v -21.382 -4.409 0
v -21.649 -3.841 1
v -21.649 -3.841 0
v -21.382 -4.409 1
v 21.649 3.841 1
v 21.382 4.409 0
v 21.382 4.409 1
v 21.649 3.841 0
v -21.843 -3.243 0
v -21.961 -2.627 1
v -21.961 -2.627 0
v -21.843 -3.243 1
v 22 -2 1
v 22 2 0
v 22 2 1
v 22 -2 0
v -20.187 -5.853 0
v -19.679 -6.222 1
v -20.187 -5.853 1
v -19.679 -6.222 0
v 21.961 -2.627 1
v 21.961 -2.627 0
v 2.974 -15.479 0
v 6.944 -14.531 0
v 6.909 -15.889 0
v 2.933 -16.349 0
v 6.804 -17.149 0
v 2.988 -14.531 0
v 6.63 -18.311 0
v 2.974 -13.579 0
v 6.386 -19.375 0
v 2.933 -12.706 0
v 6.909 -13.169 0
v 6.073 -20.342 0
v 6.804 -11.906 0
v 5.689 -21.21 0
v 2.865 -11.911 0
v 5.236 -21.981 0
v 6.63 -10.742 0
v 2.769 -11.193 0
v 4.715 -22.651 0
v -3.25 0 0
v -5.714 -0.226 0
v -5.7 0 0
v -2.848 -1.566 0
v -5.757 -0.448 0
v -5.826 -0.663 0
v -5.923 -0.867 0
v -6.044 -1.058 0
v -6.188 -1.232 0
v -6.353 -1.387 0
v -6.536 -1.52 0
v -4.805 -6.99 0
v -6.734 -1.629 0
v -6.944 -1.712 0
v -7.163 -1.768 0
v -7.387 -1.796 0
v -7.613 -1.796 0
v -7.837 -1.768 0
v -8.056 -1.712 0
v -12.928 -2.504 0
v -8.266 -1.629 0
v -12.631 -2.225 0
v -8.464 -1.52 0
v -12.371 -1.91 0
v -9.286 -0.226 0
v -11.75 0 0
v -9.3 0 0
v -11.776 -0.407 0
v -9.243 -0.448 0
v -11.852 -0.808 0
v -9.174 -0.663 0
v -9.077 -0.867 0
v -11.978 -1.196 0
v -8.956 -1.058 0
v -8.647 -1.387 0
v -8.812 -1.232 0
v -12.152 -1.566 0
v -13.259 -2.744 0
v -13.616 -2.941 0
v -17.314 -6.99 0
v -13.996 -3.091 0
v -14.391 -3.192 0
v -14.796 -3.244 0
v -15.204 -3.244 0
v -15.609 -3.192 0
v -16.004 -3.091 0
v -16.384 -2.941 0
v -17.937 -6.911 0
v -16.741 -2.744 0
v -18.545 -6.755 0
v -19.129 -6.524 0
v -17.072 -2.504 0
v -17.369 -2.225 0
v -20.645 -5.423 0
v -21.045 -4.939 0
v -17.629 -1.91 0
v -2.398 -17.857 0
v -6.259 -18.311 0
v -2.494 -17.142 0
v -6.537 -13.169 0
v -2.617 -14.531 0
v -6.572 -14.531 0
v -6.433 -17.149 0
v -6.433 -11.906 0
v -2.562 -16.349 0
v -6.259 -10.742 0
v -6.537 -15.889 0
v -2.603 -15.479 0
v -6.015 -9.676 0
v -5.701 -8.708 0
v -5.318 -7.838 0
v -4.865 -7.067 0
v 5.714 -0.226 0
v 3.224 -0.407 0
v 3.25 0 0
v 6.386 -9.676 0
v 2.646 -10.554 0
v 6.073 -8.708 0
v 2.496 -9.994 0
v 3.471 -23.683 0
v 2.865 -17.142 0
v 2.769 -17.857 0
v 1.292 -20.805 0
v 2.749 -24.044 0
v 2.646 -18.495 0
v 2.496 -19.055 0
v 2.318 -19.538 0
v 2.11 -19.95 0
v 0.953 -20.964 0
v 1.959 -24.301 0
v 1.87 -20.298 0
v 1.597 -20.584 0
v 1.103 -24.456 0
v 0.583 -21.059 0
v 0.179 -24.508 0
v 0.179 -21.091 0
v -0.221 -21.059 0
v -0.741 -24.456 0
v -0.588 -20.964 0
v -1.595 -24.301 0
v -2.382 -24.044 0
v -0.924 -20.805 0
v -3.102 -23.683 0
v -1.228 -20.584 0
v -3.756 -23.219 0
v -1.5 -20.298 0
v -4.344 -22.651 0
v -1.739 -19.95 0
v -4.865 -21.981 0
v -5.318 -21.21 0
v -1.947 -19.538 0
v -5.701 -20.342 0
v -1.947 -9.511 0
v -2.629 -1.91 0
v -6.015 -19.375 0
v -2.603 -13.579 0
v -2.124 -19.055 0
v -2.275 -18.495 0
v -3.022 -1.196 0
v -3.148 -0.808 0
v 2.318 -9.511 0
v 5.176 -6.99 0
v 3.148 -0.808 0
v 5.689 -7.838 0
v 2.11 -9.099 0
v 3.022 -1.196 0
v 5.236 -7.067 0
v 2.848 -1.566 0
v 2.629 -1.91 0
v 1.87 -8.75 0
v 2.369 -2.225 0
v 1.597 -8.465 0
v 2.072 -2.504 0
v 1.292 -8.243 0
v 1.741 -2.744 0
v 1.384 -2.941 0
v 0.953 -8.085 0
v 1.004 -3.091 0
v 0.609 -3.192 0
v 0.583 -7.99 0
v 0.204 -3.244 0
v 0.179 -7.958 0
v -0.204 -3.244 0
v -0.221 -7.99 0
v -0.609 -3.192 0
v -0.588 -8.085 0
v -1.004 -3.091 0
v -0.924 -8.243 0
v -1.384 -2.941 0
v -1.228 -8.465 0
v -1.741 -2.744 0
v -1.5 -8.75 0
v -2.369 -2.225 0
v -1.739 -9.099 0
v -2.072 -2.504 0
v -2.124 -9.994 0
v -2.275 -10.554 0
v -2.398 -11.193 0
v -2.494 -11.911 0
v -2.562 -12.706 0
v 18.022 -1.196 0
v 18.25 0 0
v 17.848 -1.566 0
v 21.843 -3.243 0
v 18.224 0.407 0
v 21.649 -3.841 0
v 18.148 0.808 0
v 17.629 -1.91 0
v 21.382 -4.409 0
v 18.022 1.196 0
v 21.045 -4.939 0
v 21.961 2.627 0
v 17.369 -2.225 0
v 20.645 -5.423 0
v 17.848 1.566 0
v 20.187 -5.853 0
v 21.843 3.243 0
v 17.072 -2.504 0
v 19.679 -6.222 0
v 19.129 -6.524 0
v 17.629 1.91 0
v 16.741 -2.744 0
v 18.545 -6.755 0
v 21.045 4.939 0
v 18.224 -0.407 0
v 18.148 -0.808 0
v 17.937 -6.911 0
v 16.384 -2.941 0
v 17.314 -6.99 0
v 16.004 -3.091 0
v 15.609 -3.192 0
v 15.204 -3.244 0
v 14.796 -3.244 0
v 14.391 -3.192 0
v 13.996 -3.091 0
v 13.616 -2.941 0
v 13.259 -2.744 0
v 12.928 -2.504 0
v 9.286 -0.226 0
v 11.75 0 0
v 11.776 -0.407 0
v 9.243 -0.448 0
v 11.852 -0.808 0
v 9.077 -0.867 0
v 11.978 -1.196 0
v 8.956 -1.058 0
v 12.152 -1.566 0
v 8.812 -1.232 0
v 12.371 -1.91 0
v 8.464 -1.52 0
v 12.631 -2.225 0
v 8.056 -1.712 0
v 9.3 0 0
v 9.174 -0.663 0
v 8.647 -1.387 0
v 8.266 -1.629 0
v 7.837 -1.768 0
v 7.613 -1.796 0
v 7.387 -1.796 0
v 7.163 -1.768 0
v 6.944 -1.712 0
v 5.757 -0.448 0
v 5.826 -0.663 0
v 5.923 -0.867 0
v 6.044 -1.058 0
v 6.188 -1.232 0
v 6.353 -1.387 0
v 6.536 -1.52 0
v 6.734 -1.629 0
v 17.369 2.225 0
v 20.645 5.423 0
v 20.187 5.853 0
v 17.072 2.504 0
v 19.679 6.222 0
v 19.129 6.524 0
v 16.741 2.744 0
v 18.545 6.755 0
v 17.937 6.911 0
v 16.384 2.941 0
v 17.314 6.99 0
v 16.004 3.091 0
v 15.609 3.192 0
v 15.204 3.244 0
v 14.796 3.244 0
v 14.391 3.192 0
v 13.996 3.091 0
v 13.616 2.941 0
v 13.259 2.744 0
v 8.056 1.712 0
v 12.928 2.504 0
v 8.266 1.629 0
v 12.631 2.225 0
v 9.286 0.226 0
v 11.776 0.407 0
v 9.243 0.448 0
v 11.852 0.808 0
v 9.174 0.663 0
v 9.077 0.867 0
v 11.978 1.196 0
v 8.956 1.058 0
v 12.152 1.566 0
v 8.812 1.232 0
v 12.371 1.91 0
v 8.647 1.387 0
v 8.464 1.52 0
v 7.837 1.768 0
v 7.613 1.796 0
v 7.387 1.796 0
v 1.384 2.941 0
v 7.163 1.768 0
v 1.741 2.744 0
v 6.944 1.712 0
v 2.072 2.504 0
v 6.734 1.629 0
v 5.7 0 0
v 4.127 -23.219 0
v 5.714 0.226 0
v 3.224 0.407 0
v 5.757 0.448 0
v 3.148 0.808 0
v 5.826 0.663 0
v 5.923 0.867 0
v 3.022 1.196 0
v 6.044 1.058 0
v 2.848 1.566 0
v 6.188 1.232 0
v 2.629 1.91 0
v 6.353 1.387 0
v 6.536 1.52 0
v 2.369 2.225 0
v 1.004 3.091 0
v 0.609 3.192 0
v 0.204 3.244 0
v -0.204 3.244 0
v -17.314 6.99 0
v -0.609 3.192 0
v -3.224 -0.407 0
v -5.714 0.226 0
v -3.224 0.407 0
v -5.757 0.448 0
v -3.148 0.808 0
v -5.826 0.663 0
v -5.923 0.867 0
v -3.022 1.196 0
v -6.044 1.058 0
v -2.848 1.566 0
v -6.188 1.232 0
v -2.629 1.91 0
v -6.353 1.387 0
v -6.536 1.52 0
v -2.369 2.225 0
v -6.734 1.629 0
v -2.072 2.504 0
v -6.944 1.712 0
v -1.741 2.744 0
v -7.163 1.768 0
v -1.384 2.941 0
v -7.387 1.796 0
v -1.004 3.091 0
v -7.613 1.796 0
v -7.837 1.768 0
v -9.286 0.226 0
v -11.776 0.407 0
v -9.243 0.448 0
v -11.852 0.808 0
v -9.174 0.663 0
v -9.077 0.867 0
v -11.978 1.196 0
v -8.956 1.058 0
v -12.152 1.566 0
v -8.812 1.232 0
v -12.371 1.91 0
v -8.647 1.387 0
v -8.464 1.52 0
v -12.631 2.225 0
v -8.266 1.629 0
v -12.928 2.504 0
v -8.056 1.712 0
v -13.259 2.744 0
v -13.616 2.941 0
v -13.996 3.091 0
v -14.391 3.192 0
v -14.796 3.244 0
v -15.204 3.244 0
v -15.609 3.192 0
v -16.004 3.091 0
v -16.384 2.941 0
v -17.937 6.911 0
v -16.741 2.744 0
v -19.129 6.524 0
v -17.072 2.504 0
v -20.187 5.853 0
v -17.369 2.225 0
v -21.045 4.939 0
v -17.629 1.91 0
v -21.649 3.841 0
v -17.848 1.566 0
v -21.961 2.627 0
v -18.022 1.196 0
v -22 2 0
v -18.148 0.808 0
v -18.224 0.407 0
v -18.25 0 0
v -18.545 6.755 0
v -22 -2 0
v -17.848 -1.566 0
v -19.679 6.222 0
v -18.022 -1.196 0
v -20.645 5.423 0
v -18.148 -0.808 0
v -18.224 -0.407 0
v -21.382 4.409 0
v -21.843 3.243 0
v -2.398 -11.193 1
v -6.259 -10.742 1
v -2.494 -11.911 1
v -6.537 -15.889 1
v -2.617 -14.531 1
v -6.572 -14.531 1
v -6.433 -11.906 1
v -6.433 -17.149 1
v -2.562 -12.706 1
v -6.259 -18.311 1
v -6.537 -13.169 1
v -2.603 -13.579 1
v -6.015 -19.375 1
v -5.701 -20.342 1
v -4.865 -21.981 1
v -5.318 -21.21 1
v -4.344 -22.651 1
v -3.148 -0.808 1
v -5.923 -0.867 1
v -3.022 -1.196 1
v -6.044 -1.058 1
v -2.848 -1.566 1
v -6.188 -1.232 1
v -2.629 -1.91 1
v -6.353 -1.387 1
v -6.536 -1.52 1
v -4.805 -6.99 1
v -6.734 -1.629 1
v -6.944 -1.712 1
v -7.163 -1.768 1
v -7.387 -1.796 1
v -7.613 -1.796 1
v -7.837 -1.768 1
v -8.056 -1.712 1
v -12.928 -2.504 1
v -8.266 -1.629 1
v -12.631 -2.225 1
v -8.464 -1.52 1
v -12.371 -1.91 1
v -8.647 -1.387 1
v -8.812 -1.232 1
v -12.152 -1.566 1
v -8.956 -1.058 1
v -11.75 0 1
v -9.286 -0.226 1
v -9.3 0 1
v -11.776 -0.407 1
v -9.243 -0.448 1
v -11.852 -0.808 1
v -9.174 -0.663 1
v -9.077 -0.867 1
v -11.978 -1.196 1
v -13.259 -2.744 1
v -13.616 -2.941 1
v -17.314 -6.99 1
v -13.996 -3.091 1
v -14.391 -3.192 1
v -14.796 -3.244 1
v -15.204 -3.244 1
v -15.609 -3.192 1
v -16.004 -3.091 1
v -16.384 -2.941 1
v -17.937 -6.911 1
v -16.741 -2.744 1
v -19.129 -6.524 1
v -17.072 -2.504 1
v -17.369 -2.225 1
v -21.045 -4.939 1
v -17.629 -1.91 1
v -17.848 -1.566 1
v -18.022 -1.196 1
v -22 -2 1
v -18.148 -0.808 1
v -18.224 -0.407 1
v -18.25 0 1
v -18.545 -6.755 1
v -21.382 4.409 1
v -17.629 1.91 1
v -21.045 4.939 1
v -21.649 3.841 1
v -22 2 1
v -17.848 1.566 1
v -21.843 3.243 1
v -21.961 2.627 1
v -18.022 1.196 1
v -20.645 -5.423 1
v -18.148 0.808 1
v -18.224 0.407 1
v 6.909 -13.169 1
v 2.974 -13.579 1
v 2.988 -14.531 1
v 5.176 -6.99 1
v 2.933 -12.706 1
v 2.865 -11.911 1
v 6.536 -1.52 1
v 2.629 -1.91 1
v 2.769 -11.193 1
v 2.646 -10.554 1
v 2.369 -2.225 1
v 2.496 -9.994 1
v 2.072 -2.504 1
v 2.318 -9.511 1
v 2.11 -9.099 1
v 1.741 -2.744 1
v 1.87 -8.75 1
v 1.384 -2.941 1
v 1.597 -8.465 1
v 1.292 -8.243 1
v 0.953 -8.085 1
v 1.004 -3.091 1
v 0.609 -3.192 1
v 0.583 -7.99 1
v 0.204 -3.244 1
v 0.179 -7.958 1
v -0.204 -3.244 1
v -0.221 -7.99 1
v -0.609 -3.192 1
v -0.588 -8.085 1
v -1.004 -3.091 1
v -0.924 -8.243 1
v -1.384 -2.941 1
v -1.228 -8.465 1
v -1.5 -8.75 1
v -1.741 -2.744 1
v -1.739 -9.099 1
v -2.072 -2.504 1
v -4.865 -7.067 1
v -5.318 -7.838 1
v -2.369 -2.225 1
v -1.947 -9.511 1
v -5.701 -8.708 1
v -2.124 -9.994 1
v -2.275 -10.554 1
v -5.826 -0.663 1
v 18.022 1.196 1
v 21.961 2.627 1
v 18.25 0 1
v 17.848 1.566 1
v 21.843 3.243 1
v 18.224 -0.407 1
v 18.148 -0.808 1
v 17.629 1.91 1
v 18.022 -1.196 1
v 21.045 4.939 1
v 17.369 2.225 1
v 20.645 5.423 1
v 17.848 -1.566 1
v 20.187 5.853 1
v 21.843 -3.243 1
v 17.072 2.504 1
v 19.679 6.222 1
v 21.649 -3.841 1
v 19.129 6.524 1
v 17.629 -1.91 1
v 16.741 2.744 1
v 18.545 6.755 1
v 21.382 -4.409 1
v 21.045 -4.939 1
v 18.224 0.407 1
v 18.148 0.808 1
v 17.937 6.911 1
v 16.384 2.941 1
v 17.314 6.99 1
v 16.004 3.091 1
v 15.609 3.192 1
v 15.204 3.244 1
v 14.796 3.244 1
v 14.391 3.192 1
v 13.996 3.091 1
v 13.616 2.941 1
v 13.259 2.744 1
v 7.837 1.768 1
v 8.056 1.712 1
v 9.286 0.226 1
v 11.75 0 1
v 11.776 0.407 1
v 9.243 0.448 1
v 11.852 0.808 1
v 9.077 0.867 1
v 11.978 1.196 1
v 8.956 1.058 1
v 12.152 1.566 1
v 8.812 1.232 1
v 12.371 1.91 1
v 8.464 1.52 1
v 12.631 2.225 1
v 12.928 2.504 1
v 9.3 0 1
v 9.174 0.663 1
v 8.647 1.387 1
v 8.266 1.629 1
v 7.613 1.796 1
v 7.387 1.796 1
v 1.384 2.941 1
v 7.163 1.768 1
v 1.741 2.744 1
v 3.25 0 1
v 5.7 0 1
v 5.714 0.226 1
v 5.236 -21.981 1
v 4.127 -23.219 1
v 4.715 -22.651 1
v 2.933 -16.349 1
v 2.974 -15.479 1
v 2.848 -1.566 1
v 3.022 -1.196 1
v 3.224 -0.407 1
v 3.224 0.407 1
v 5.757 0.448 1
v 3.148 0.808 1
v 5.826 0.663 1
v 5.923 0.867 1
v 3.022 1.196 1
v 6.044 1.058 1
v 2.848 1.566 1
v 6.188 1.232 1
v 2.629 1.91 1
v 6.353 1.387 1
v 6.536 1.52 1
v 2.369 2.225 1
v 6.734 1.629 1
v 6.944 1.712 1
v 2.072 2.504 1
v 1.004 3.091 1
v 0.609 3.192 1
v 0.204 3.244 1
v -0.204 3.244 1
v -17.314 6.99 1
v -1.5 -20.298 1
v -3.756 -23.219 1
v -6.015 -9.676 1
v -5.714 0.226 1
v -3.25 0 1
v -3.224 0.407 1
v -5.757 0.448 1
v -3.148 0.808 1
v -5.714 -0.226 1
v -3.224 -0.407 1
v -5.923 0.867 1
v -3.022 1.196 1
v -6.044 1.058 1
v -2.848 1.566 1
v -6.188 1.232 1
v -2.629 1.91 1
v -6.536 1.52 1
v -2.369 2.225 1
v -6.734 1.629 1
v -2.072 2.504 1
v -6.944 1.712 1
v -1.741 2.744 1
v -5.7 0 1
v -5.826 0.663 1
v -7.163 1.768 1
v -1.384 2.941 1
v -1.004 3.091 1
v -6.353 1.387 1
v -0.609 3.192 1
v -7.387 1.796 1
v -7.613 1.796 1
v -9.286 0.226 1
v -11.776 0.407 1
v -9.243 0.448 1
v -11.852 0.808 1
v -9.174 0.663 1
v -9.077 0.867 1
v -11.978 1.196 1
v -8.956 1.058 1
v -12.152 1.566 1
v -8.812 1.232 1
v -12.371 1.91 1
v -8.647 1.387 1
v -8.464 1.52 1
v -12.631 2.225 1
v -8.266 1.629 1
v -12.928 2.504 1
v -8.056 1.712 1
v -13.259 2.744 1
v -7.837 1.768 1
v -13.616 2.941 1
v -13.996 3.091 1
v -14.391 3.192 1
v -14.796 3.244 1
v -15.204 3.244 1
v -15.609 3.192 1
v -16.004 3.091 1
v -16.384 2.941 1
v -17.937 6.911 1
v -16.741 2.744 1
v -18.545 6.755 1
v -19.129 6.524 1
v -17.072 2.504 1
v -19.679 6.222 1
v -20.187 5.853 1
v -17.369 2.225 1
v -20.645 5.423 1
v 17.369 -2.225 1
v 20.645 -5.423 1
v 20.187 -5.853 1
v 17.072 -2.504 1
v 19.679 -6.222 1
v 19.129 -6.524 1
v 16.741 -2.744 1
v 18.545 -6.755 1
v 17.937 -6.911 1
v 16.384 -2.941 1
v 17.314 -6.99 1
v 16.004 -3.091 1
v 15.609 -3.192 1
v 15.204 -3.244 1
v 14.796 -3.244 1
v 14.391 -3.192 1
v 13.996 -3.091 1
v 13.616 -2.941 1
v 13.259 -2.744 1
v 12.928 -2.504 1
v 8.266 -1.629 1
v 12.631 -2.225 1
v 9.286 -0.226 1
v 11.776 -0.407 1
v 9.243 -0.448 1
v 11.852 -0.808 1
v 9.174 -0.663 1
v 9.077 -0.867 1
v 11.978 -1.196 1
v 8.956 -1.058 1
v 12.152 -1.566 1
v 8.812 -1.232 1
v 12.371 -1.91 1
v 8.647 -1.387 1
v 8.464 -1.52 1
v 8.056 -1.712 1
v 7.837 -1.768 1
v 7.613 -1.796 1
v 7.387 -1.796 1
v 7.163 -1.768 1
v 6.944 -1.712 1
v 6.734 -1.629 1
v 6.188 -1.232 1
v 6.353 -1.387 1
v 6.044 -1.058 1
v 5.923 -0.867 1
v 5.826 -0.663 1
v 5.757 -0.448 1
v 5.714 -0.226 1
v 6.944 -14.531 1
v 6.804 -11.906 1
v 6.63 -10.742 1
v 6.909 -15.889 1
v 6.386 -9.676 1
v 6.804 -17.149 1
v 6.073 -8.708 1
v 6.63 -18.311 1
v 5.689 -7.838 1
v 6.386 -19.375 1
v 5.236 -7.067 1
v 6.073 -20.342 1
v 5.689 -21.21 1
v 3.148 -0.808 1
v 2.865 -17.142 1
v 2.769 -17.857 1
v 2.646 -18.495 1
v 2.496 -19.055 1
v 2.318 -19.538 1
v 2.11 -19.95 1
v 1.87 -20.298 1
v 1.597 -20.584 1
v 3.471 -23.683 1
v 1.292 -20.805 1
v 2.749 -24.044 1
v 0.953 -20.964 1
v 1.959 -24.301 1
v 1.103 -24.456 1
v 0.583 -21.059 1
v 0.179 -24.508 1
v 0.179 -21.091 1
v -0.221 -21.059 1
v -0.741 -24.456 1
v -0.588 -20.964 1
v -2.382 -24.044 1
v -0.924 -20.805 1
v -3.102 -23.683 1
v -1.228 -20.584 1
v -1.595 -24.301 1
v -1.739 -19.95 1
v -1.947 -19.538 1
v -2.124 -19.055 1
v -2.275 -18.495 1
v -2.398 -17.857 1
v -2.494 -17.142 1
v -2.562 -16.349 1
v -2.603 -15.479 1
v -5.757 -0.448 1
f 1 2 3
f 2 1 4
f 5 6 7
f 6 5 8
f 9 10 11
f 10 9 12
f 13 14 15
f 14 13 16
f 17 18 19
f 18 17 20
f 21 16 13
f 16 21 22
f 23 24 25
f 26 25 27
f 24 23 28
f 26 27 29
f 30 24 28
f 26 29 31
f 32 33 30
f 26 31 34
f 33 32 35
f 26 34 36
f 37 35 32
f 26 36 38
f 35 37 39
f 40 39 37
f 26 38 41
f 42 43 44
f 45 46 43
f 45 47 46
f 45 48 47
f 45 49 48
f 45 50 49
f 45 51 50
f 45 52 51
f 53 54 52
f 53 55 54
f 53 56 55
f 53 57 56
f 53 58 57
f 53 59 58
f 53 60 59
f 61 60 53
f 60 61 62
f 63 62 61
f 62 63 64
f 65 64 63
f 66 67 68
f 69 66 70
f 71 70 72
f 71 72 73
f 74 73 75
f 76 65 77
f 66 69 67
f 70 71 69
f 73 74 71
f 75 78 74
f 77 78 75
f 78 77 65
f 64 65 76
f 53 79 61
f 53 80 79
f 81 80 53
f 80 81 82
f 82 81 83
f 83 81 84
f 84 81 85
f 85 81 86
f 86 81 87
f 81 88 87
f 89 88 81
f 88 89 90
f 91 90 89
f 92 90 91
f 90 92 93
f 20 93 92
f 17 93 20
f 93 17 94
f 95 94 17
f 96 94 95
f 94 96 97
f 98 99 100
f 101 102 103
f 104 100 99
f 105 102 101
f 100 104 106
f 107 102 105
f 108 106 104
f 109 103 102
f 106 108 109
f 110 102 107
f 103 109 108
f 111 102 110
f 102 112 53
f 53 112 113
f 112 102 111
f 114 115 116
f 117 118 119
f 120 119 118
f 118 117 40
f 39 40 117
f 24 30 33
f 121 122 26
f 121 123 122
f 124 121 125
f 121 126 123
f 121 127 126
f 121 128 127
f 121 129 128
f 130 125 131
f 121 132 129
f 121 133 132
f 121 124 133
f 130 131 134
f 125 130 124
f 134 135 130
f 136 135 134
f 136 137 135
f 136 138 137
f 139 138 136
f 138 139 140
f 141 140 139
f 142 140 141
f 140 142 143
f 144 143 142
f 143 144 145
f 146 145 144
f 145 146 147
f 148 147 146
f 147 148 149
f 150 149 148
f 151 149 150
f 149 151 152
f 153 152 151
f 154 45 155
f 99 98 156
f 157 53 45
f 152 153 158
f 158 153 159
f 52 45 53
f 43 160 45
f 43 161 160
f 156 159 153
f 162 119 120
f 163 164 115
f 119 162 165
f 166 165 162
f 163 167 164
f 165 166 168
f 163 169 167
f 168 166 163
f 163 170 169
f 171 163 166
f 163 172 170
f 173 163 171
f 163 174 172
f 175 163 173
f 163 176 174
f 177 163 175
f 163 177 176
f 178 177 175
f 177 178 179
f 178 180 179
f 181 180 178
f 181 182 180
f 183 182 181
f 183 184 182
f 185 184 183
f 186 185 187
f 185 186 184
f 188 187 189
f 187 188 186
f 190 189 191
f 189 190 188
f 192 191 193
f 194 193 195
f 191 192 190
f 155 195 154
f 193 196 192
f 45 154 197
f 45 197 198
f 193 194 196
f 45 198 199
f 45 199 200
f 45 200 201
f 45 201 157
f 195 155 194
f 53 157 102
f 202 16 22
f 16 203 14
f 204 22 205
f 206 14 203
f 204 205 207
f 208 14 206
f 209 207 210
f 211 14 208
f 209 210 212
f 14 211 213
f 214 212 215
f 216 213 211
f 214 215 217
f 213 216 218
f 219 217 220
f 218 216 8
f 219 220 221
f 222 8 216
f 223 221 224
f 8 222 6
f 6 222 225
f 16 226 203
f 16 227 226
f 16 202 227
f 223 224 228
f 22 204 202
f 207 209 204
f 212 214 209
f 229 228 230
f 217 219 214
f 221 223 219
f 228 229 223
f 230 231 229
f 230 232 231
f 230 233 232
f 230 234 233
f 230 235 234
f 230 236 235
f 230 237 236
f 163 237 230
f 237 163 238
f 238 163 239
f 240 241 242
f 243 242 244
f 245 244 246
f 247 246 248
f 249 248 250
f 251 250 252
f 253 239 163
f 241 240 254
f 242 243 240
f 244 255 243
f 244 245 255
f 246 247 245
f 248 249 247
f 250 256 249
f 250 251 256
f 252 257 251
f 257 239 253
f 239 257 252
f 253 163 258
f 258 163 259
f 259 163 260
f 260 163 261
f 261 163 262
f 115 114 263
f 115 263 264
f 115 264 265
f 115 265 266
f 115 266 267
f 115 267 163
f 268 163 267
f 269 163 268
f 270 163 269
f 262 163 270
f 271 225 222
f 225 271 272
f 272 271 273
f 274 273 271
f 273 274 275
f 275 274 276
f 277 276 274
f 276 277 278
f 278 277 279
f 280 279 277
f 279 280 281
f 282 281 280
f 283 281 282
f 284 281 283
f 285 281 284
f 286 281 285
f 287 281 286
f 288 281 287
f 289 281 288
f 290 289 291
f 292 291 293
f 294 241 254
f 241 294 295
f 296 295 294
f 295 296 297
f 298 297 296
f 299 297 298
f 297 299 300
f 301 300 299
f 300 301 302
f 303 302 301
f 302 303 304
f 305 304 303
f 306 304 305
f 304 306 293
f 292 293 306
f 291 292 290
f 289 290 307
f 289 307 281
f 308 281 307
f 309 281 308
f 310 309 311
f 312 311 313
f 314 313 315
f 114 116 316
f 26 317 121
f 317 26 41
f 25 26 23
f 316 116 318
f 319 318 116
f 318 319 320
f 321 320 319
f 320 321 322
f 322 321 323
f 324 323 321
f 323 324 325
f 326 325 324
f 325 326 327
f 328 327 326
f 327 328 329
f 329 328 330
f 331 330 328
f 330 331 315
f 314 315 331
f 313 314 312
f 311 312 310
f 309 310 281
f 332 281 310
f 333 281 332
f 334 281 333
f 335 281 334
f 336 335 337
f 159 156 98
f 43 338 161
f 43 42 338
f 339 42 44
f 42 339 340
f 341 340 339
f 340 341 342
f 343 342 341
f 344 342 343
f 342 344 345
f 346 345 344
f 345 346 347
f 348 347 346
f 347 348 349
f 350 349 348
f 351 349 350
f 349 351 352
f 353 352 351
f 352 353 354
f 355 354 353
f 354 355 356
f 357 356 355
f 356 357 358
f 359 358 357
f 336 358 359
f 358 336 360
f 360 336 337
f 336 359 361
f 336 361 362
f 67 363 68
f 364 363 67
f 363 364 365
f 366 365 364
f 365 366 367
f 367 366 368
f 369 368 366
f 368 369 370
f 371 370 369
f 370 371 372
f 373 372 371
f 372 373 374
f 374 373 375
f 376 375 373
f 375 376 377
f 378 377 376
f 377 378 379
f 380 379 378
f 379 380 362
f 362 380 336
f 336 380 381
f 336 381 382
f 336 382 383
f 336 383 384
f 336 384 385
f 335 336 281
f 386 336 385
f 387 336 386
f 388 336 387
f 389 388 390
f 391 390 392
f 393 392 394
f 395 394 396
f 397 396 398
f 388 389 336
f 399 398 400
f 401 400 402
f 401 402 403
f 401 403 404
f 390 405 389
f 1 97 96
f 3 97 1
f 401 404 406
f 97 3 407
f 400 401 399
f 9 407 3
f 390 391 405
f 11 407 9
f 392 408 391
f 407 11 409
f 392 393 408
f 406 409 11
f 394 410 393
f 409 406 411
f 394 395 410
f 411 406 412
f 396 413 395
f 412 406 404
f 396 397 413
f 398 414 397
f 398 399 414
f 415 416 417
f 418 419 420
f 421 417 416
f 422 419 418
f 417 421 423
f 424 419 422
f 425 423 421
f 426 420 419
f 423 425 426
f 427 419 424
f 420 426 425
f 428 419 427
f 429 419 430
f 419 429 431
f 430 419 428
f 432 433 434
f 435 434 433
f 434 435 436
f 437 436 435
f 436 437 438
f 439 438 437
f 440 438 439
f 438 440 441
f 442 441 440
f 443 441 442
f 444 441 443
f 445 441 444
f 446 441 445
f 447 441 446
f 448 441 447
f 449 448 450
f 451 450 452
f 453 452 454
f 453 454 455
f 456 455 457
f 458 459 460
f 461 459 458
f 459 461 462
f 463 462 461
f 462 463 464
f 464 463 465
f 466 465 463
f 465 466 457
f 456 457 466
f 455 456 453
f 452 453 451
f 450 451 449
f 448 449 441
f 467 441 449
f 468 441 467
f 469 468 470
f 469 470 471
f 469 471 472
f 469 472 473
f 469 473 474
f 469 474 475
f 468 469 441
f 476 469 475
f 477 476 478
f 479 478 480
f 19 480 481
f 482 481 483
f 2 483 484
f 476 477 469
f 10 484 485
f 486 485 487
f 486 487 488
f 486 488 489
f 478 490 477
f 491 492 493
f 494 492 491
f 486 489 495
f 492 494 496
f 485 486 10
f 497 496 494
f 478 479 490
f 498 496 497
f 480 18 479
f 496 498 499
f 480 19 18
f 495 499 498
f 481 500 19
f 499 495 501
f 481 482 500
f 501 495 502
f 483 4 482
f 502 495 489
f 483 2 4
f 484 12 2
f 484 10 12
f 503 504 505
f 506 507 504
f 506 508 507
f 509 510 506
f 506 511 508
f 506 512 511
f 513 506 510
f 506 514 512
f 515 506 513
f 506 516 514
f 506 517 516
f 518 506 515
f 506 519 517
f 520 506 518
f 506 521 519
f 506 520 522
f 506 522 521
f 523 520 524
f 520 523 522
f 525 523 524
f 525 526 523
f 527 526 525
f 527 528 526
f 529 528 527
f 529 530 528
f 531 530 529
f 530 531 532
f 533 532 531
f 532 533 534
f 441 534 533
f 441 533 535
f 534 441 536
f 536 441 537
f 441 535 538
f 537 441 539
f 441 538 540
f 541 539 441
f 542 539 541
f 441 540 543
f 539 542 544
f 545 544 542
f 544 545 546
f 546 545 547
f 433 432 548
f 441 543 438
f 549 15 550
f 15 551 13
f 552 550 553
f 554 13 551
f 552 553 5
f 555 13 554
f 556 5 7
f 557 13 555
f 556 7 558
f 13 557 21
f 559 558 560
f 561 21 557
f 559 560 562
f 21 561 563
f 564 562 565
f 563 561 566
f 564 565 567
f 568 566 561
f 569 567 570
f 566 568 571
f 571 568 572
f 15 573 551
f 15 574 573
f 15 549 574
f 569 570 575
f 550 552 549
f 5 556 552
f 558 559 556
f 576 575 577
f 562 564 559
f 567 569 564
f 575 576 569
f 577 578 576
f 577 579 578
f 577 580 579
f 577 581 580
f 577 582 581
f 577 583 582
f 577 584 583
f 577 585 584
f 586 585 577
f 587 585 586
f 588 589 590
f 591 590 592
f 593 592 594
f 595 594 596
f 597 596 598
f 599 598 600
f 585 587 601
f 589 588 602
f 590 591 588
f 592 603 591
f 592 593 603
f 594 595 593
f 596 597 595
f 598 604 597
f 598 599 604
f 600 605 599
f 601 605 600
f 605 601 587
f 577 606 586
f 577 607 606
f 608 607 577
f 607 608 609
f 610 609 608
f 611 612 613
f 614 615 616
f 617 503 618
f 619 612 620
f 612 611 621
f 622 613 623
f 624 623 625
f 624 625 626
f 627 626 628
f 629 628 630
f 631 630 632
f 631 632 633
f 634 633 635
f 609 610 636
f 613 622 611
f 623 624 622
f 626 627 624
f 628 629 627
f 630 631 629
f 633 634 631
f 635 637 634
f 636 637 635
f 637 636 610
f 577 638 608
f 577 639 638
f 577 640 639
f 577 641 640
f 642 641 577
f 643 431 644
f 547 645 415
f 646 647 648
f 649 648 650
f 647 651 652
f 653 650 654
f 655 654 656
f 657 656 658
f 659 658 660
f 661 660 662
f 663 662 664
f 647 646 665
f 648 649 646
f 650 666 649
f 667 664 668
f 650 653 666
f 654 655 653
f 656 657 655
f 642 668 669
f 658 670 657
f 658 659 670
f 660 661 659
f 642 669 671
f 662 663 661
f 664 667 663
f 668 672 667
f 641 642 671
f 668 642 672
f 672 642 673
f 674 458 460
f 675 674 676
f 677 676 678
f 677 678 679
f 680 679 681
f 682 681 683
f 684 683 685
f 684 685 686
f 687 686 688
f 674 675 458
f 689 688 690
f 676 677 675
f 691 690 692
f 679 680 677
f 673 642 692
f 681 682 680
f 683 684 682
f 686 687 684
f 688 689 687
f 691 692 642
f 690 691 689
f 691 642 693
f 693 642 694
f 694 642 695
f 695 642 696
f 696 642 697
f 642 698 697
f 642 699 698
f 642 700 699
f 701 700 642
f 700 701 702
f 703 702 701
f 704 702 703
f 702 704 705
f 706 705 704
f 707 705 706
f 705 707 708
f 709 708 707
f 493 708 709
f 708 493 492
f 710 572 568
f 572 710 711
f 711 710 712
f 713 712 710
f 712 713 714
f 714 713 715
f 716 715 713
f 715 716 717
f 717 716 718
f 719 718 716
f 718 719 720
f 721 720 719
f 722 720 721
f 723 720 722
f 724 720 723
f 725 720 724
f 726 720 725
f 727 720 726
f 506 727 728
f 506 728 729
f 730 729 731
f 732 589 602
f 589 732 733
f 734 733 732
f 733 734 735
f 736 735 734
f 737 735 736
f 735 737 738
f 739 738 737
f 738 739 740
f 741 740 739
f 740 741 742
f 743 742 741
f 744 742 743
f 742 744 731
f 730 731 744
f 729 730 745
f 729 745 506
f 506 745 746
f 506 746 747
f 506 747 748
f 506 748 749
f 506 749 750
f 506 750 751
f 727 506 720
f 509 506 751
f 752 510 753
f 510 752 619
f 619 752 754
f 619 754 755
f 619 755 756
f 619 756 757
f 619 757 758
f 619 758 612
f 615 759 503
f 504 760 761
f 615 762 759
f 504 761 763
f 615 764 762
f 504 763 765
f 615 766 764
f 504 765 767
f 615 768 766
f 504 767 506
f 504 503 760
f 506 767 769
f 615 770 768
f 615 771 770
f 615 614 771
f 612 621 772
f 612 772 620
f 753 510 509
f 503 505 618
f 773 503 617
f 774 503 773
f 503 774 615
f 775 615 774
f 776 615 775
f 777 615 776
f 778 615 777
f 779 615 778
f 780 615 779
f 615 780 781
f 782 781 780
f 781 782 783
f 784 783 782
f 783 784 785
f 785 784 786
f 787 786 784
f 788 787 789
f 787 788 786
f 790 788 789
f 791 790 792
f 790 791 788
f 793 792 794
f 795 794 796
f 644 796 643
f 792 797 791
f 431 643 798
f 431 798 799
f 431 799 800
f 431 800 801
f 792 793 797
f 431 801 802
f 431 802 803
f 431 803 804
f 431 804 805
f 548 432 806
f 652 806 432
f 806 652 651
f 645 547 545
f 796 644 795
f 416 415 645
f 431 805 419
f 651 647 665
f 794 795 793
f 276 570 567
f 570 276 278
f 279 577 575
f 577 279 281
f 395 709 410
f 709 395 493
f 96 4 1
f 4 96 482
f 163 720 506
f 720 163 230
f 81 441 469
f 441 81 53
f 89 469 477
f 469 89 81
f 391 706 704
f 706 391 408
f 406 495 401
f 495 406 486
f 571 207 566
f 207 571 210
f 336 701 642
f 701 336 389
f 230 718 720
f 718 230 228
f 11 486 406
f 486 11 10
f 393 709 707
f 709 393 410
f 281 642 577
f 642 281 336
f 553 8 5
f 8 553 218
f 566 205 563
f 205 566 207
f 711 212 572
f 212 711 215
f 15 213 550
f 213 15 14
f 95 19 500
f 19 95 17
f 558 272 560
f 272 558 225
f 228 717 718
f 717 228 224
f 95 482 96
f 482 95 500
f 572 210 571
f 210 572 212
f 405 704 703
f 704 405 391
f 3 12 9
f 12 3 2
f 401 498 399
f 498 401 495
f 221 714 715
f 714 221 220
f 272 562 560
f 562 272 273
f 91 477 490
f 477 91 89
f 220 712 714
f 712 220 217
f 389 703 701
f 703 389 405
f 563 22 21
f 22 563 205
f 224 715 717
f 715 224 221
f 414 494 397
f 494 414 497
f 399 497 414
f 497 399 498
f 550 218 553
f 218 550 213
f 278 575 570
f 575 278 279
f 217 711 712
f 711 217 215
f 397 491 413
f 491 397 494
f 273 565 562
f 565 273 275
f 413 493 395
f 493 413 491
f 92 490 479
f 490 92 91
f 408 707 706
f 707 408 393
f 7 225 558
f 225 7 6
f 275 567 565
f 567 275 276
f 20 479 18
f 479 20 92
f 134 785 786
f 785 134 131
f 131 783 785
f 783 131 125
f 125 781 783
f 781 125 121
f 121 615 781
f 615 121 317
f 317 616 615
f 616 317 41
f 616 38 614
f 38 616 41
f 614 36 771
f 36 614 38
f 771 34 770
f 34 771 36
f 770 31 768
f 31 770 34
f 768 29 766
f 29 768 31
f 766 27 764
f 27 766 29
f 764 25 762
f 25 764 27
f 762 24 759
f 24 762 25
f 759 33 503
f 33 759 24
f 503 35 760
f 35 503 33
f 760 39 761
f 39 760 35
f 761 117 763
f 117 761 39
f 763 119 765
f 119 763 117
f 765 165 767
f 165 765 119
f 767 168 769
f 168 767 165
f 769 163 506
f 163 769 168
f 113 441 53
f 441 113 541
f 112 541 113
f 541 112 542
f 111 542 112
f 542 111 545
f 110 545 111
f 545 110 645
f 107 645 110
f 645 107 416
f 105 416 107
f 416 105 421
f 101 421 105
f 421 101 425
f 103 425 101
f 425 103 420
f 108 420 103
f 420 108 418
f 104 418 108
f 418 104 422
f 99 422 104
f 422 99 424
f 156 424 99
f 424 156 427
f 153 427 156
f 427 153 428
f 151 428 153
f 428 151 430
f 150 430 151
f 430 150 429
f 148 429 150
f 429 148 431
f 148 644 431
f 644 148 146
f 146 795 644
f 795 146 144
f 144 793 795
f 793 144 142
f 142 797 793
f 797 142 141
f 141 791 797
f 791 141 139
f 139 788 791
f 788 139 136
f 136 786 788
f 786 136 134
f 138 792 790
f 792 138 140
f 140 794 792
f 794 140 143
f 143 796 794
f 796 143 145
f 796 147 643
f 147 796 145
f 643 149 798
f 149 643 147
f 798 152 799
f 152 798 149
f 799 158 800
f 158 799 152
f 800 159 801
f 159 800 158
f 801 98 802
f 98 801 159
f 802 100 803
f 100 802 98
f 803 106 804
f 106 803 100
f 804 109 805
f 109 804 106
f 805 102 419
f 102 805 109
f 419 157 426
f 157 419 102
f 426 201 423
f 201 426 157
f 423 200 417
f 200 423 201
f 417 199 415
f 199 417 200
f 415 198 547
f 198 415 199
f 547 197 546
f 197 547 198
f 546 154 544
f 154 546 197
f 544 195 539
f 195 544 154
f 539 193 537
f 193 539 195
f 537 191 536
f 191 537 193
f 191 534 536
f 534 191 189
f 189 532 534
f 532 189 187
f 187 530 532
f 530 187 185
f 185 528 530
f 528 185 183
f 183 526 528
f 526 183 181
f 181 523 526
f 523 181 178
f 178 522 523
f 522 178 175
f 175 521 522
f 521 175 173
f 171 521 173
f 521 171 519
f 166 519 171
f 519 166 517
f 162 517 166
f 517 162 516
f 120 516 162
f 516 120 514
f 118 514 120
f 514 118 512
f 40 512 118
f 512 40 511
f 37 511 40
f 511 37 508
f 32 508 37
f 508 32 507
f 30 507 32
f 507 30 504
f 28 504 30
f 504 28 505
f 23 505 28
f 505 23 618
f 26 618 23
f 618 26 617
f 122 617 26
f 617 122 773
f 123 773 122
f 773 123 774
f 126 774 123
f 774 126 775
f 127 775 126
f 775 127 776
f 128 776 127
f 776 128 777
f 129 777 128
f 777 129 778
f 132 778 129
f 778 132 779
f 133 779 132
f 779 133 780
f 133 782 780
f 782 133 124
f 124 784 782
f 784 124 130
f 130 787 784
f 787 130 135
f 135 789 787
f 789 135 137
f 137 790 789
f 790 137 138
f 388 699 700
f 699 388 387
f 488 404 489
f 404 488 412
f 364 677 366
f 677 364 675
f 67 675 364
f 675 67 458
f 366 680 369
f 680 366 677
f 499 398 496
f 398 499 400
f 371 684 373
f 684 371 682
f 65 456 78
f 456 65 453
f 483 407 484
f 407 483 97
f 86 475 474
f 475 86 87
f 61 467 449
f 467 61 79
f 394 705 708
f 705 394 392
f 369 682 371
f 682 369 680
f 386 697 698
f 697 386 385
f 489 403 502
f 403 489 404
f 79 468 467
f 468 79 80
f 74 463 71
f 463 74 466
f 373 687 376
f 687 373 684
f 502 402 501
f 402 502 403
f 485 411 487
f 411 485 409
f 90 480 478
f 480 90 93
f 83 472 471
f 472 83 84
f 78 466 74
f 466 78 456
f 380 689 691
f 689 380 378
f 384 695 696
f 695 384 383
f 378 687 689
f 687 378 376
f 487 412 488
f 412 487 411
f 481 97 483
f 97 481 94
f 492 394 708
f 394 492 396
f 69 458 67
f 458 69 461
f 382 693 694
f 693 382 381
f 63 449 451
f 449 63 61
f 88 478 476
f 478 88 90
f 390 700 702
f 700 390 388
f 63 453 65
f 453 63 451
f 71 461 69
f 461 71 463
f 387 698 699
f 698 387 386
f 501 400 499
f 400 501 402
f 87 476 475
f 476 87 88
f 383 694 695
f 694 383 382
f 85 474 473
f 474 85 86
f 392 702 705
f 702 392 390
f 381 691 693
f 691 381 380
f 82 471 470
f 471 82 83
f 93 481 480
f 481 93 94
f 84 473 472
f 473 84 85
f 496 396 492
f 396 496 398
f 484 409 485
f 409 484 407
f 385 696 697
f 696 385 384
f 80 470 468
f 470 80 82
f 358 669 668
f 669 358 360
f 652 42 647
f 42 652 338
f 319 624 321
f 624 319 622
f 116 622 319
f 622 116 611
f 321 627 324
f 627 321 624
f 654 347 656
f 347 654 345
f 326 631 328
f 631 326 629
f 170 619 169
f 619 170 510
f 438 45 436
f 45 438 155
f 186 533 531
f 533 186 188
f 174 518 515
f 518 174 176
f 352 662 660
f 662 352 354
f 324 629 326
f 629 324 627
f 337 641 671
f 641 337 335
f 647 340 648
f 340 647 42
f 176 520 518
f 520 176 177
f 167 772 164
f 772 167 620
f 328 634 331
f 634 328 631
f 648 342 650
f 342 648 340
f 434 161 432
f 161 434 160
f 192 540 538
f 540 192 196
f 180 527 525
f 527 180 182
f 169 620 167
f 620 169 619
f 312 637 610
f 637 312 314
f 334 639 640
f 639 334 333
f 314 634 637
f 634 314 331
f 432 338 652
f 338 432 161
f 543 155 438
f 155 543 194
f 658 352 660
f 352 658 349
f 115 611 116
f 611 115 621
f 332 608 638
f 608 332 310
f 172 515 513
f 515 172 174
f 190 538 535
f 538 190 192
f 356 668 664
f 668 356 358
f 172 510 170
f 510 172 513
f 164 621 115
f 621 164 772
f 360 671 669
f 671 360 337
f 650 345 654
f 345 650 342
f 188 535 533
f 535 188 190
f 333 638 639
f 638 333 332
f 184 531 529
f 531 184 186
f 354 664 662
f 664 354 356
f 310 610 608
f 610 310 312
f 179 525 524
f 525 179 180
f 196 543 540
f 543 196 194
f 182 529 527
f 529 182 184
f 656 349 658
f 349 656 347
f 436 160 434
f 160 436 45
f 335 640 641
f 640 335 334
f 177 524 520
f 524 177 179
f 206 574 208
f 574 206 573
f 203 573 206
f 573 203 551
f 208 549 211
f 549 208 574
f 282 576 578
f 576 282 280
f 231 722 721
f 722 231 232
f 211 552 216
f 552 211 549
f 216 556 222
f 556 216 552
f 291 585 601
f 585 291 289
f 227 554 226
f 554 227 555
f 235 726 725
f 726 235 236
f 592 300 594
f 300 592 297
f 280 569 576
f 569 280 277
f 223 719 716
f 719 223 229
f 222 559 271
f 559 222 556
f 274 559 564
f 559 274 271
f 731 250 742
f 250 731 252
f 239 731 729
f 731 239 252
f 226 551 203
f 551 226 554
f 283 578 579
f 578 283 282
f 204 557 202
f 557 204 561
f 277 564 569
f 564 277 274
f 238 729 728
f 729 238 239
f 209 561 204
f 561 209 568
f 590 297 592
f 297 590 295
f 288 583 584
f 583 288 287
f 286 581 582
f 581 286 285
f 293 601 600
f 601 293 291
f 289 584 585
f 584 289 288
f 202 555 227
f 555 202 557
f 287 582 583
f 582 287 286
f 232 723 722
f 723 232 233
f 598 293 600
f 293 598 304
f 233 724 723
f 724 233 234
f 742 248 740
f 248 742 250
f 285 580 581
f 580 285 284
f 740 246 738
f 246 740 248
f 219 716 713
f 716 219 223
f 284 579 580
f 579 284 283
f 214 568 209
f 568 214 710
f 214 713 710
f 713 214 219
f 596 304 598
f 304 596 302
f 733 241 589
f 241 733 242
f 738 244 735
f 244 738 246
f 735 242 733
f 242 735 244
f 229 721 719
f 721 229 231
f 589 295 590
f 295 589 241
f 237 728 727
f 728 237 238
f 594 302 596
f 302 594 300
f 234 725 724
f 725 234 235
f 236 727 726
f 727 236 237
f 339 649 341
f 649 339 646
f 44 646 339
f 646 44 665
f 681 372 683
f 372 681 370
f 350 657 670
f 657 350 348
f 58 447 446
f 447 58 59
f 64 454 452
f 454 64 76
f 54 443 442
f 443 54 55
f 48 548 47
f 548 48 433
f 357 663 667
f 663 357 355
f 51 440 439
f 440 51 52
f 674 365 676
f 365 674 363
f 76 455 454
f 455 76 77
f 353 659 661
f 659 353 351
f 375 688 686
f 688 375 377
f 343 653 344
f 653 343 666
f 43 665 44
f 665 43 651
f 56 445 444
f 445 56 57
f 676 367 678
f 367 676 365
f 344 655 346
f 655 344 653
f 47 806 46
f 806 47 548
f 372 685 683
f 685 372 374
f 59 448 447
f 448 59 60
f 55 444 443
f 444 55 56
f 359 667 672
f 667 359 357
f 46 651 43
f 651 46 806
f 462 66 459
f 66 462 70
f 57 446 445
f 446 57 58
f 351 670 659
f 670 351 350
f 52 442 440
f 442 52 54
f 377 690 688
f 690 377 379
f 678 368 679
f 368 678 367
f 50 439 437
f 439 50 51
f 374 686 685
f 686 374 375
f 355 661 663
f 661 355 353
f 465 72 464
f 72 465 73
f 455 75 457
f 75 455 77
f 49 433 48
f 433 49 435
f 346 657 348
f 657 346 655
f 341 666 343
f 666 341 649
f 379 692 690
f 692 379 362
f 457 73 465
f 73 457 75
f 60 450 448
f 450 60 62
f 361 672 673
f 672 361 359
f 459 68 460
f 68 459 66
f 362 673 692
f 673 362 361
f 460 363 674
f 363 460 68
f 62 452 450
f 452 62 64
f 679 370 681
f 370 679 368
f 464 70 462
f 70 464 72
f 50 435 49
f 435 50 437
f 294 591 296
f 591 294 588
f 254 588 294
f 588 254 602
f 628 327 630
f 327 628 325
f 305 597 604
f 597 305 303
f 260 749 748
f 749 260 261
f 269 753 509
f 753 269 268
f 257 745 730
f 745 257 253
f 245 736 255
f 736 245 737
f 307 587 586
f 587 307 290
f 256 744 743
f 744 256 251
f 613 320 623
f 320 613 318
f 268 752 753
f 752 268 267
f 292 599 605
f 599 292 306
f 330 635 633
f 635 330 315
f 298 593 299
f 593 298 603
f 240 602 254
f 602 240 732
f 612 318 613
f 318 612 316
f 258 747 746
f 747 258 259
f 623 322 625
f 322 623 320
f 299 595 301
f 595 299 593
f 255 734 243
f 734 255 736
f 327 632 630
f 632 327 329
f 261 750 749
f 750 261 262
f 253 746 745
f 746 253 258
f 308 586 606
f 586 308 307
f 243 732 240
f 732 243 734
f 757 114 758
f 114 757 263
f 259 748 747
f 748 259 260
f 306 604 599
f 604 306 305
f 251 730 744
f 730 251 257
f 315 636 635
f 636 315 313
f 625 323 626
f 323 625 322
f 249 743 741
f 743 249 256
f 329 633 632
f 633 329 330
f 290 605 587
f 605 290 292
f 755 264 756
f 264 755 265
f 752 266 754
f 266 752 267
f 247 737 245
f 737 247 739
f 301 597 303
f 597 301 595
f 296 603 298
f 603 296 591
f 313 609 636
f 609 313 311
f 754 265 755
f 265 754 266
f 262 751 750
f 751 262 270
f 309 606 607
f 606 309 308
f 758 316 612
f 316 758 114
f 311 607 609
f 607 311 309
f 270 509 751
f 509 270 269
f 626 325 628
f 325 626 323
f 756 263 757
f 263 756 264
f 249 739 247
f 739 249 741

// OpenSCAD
$fn = 50;


difference() {
	union() {
		hull() {
			translate(v = [-17.0000000000, 2.0000000000, 0]) {
				cylinder(h = 1, r = 5);
			}
			translate(v = [17.0000000000, 2.0000000000, 0]) {
				cylinder(h = 1, r = 5);
			}
			translate(v = [-17.0000000000, -2.0000000000, 0]) {
				cylinder(h = 1, r = 5);
			}
			translate(v = [17.0000000000, -2.0000000000, 0]) {
				cylinder(h = 1, r = 5);
			}
		}
		translate(v = [0, -5, 0]) {
			linear_extrude(height = 1) {
				text(font = "DejaVu Sans Mono:style=Bold", halign = "center", size = 19.0000000000, text = "O", valign = "top");
			}
		}
	}
	union() {
		translate(v = [-15.0000000000, 0.0000000000, 0]) {
			translate(v = [0, 0, -100]) {
				cylinder(h = 200, r = 3.2500000000);
			}
		}
		translate(v = [0, 0, -100]) {
			cylinder(h = 200, r = 3.2500000000);
		}
		translate(v = [15.0000000000, 0.0000000000, 0]) {
			translate(v = [0, 0, -100]) {
				cylinder(h = 200, r = 3.2500000000);
			}
		}
		translate(v = [-15.0000000000, 0.0000000000, 0]) {
			translate(v = [0, 0, -100]) {
				cylinder(h = 200, r = 1.8000000000);
			}
		}
		translate(v = [-7.5000000000, 0.0000000000, 0]) {
			translate(v = [0, 0, -100]) {
				cylinder(h = 200, r = 1.8000000000);
			}
		}
		translate(v = [0, 0, -100]) {
			cylinder(h = 200, r = 1.8000000000);
		}
		translate(v = [7.5000000000, 0.0000000000, 0]) {
			translate(v = [0, 0, -100]) {
				cylinder(h = 200, r = 1.8000000000);
			}
		}
		translate(v = [15.0000000000, 0.0000000000, 0]) {
			translate(v = [0, 0, -100]) {
				cylinder(h = 200, r = 1.8000000000);
			}
		}
	}
}
